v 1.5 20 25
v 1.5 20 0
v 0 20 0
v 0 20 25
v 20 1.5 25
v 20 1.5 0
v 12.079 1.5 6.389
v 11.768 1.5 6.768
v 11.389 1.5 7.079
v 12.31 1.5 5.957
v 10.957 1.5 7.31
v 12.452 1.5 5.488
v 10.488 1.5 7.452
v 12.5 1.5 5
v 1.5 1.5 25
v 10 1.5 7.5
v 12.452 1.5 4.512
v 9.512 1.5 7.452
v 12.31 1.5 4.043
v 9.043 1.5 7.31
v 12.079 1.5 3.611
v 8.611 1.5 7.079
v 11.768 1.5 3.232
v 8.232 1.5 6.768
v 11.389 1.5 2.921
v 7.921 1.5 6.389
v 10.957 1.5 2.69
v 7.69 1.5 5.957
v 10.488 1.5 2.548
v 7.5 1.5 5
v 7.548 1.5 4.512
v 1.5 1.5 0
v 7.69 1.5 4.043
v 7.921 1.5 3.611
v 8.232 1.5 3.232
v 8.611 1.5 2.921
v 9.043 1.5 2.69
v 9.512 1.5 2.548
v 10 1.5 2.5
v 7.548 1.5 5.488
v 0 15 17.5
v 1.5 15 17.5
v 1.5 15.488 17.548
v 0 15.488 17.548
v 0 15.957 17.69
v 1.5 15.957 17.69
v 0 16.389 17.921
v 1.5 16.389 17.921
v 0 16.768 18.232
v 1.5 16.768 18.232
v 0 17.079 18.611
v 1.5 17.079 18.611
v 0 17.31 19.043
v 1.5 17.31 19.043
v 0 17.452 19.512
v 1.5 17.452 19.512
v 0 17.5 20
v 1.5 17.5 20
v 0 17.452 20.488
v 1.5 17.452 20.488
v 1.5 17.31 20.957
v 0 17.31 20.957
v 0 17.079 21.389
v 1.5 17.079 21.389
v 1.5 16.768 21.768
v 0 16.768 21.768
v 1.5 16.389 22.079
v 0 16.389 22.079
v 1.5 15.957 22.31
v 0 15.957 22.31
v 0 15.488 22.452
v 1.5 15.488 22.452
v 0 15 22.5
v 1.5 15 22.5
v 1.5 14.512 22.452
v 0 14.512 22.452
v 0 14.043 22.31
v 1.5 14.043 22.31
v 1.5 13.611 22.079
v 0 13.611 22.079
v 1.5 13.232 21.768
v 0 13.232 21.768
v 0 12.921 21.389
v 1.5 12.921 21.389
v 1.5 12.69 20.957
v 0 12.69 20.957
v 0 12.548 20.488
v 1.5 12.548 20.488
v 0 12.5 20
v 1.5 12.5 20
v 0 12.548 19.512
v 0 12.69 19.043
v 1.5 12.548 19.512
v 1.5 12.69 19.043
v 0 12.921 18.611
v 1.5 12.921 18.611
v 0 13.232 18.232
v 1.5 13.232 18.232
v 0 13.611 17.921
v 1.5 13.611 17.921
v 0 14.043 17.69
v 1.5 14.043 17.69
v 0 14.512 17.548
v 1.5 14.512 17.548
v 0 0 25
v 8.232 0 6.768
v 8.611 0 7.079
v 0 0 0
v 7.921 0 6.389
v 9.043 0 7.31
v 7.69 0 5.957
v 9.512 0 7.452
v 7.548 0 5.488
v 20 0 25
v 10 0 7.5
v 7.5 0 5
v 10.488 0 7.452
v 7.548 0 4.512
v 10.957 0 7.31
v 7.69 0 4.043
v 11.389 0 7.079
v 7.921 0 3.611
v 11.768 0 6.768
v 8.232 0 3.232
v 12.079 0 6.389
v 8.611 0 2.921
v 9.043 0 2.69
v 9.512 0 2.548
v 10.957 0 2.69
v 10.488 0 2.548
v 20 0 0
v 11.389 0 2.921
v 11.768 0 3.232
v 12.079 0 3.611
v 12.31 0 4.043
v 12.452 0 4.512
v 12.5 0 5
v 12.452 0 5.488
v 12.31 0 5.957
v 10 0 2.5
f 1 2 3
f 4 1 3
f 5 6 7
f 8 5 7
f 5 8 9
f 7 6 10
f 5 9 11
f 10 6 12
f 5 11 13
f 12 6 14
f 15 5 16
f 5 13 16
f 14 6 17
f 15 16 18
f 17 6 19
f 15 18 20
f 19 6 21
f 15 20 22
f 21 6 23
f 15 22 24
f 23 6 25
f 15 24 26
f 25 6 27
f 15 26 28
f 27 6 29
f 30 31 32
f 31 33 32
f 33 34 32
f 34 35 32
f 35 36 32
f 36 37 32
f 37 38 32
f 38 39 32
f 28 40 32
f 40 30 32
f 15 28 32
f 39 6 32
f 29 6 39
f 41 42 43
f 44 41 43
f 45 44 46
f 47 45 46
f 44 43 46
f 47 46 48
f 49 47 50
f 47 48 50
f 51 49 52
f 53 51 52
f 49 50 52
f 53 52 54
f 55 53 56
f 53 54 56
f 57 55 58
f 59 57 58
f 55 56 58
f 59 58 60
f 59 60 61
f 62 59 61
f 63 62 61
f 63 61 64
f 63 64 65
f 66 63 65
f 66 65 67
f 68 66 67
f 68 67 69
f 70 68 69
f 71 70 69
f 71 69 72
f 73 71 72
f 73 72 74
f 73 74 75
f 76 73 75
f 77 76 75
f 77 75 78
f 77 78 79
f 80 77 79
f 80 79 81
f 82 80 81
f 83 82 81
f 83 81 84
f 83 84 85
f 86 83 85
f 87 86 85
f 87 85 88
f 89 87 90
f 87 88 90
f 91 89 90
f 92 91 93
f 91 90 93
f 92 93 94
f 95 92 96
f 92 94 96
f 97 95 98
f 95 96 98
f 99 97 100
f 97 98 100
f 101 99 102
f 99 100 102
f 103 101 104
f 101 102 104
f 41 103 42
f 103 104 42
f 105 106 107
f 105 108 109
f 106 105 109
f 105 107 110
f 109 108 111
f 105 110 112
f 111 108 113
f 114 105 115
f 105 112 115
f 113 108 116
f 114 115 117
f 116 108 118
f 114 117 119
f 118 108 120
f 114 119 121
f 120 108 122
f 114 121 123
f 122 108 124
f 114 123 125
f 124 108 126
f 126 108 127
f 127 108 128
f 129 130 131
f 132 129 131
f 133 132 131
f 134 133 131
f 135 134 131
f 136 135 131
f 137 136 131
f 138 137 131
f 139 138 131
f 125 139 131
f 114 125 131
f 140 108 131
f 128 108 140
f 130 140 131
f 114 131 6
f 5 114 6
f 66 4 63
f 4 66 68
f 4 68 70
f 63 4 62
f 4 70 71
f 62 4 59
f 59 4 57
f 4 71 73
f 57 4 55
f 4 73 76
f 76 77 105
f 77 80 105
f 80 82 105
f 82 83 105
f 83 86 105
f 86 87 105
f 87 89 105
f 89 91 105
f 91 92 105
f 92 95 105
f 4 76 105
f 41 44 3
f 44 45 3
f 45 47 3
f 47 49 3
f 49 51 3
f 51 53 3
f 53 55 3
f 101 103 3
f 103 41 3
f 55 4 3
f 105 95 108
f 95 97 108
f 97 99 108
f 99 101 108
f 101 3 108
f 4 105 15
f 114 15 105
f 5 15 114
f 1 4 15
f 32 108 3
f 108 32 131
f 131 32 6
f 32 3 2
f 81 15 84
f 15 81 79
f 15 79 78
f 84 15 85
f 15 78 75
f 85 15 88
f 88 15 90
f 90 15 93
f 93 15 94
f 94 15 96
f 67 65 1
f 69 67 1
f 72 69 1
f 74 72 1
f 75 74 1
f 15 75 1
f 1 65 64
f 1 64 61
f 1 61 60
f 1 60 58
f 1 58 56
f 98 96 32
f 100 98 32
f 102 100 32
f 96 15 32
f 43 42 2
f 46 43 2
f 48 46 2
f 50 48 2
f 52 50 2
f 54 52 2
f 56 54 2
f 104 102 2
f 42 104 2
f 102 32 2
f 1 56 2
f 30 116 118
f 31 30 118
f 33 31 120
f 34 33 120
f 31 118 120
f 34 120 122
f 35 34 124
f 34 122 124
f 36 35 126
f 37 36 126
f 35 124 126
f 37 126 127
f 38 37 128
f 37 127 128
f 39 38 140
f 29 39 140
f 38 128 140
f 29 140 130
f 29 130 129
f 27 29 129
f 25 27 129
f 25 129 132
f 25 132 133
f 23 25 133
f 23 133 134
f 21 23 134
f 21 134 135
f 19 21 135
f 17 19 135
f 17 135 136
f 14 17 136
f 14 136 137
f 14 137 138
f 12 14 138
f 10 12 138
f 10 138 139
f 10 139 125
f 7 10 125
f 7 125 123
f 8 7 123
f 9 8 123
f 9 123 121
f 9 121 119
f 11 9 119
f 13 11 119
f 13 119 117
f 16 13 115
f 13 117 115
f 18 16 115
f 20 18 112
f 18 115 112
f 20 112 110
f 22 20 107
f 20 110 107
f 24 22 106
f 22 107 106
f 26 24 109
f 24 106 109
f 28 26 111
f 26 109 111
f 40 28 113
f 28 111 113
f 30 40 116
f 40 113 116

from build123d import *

# Parameters (mm, degrees)
EXTRUDE_THIN1_DEPTH = 25
SKETCH2_R           = 2.5
CUT_EXTRUDE1_DEPTH  = 21
SKETCH3_R           = 2.5
CUT_EXTRUDE2_DEPTH  = 2.5


with BuildPart() as part:
    # Sketch1 → Extrude-Thin1 (new body)
    with BuildSketch(Plane.XY):
        Polygon((0, 20), (0, 0), (20, 0), (20, 1.5), (1.5, 1.5), (1.5, 20), align=None)
    extrude(amount=EXTRUDE_THIN1_DEPTH)

    # Sketch2 → Cut-Extrude1 (cut, through all)
    with BuildSketch(Plane(origin=(0, 0, 0), x_dir=(-1, 0, 0), z_dir=(0, -1, 0))):
        with Locations((-10, -5)):
            Circle(SKETCH2_R)
    extrude(amount=-CUT_EXTRUDE1_DEPTH, mode=Mode.SUBTRACT)

    # Sketch3 → Cut-Extrude2 (cut, through all)
    with BuildSketch(Plane(origin=(1.5, 0, 0), x_dir=(0, 0, -1), z_dir=(1, 0, 0))):
        with Locations((-20, 15)):
            Circle(SKETCH3_R)
    extrude(amount=-CUT_EXTRUDE2_DEPTH, mode=Mode.SUBTRACT)


solid = part.part
